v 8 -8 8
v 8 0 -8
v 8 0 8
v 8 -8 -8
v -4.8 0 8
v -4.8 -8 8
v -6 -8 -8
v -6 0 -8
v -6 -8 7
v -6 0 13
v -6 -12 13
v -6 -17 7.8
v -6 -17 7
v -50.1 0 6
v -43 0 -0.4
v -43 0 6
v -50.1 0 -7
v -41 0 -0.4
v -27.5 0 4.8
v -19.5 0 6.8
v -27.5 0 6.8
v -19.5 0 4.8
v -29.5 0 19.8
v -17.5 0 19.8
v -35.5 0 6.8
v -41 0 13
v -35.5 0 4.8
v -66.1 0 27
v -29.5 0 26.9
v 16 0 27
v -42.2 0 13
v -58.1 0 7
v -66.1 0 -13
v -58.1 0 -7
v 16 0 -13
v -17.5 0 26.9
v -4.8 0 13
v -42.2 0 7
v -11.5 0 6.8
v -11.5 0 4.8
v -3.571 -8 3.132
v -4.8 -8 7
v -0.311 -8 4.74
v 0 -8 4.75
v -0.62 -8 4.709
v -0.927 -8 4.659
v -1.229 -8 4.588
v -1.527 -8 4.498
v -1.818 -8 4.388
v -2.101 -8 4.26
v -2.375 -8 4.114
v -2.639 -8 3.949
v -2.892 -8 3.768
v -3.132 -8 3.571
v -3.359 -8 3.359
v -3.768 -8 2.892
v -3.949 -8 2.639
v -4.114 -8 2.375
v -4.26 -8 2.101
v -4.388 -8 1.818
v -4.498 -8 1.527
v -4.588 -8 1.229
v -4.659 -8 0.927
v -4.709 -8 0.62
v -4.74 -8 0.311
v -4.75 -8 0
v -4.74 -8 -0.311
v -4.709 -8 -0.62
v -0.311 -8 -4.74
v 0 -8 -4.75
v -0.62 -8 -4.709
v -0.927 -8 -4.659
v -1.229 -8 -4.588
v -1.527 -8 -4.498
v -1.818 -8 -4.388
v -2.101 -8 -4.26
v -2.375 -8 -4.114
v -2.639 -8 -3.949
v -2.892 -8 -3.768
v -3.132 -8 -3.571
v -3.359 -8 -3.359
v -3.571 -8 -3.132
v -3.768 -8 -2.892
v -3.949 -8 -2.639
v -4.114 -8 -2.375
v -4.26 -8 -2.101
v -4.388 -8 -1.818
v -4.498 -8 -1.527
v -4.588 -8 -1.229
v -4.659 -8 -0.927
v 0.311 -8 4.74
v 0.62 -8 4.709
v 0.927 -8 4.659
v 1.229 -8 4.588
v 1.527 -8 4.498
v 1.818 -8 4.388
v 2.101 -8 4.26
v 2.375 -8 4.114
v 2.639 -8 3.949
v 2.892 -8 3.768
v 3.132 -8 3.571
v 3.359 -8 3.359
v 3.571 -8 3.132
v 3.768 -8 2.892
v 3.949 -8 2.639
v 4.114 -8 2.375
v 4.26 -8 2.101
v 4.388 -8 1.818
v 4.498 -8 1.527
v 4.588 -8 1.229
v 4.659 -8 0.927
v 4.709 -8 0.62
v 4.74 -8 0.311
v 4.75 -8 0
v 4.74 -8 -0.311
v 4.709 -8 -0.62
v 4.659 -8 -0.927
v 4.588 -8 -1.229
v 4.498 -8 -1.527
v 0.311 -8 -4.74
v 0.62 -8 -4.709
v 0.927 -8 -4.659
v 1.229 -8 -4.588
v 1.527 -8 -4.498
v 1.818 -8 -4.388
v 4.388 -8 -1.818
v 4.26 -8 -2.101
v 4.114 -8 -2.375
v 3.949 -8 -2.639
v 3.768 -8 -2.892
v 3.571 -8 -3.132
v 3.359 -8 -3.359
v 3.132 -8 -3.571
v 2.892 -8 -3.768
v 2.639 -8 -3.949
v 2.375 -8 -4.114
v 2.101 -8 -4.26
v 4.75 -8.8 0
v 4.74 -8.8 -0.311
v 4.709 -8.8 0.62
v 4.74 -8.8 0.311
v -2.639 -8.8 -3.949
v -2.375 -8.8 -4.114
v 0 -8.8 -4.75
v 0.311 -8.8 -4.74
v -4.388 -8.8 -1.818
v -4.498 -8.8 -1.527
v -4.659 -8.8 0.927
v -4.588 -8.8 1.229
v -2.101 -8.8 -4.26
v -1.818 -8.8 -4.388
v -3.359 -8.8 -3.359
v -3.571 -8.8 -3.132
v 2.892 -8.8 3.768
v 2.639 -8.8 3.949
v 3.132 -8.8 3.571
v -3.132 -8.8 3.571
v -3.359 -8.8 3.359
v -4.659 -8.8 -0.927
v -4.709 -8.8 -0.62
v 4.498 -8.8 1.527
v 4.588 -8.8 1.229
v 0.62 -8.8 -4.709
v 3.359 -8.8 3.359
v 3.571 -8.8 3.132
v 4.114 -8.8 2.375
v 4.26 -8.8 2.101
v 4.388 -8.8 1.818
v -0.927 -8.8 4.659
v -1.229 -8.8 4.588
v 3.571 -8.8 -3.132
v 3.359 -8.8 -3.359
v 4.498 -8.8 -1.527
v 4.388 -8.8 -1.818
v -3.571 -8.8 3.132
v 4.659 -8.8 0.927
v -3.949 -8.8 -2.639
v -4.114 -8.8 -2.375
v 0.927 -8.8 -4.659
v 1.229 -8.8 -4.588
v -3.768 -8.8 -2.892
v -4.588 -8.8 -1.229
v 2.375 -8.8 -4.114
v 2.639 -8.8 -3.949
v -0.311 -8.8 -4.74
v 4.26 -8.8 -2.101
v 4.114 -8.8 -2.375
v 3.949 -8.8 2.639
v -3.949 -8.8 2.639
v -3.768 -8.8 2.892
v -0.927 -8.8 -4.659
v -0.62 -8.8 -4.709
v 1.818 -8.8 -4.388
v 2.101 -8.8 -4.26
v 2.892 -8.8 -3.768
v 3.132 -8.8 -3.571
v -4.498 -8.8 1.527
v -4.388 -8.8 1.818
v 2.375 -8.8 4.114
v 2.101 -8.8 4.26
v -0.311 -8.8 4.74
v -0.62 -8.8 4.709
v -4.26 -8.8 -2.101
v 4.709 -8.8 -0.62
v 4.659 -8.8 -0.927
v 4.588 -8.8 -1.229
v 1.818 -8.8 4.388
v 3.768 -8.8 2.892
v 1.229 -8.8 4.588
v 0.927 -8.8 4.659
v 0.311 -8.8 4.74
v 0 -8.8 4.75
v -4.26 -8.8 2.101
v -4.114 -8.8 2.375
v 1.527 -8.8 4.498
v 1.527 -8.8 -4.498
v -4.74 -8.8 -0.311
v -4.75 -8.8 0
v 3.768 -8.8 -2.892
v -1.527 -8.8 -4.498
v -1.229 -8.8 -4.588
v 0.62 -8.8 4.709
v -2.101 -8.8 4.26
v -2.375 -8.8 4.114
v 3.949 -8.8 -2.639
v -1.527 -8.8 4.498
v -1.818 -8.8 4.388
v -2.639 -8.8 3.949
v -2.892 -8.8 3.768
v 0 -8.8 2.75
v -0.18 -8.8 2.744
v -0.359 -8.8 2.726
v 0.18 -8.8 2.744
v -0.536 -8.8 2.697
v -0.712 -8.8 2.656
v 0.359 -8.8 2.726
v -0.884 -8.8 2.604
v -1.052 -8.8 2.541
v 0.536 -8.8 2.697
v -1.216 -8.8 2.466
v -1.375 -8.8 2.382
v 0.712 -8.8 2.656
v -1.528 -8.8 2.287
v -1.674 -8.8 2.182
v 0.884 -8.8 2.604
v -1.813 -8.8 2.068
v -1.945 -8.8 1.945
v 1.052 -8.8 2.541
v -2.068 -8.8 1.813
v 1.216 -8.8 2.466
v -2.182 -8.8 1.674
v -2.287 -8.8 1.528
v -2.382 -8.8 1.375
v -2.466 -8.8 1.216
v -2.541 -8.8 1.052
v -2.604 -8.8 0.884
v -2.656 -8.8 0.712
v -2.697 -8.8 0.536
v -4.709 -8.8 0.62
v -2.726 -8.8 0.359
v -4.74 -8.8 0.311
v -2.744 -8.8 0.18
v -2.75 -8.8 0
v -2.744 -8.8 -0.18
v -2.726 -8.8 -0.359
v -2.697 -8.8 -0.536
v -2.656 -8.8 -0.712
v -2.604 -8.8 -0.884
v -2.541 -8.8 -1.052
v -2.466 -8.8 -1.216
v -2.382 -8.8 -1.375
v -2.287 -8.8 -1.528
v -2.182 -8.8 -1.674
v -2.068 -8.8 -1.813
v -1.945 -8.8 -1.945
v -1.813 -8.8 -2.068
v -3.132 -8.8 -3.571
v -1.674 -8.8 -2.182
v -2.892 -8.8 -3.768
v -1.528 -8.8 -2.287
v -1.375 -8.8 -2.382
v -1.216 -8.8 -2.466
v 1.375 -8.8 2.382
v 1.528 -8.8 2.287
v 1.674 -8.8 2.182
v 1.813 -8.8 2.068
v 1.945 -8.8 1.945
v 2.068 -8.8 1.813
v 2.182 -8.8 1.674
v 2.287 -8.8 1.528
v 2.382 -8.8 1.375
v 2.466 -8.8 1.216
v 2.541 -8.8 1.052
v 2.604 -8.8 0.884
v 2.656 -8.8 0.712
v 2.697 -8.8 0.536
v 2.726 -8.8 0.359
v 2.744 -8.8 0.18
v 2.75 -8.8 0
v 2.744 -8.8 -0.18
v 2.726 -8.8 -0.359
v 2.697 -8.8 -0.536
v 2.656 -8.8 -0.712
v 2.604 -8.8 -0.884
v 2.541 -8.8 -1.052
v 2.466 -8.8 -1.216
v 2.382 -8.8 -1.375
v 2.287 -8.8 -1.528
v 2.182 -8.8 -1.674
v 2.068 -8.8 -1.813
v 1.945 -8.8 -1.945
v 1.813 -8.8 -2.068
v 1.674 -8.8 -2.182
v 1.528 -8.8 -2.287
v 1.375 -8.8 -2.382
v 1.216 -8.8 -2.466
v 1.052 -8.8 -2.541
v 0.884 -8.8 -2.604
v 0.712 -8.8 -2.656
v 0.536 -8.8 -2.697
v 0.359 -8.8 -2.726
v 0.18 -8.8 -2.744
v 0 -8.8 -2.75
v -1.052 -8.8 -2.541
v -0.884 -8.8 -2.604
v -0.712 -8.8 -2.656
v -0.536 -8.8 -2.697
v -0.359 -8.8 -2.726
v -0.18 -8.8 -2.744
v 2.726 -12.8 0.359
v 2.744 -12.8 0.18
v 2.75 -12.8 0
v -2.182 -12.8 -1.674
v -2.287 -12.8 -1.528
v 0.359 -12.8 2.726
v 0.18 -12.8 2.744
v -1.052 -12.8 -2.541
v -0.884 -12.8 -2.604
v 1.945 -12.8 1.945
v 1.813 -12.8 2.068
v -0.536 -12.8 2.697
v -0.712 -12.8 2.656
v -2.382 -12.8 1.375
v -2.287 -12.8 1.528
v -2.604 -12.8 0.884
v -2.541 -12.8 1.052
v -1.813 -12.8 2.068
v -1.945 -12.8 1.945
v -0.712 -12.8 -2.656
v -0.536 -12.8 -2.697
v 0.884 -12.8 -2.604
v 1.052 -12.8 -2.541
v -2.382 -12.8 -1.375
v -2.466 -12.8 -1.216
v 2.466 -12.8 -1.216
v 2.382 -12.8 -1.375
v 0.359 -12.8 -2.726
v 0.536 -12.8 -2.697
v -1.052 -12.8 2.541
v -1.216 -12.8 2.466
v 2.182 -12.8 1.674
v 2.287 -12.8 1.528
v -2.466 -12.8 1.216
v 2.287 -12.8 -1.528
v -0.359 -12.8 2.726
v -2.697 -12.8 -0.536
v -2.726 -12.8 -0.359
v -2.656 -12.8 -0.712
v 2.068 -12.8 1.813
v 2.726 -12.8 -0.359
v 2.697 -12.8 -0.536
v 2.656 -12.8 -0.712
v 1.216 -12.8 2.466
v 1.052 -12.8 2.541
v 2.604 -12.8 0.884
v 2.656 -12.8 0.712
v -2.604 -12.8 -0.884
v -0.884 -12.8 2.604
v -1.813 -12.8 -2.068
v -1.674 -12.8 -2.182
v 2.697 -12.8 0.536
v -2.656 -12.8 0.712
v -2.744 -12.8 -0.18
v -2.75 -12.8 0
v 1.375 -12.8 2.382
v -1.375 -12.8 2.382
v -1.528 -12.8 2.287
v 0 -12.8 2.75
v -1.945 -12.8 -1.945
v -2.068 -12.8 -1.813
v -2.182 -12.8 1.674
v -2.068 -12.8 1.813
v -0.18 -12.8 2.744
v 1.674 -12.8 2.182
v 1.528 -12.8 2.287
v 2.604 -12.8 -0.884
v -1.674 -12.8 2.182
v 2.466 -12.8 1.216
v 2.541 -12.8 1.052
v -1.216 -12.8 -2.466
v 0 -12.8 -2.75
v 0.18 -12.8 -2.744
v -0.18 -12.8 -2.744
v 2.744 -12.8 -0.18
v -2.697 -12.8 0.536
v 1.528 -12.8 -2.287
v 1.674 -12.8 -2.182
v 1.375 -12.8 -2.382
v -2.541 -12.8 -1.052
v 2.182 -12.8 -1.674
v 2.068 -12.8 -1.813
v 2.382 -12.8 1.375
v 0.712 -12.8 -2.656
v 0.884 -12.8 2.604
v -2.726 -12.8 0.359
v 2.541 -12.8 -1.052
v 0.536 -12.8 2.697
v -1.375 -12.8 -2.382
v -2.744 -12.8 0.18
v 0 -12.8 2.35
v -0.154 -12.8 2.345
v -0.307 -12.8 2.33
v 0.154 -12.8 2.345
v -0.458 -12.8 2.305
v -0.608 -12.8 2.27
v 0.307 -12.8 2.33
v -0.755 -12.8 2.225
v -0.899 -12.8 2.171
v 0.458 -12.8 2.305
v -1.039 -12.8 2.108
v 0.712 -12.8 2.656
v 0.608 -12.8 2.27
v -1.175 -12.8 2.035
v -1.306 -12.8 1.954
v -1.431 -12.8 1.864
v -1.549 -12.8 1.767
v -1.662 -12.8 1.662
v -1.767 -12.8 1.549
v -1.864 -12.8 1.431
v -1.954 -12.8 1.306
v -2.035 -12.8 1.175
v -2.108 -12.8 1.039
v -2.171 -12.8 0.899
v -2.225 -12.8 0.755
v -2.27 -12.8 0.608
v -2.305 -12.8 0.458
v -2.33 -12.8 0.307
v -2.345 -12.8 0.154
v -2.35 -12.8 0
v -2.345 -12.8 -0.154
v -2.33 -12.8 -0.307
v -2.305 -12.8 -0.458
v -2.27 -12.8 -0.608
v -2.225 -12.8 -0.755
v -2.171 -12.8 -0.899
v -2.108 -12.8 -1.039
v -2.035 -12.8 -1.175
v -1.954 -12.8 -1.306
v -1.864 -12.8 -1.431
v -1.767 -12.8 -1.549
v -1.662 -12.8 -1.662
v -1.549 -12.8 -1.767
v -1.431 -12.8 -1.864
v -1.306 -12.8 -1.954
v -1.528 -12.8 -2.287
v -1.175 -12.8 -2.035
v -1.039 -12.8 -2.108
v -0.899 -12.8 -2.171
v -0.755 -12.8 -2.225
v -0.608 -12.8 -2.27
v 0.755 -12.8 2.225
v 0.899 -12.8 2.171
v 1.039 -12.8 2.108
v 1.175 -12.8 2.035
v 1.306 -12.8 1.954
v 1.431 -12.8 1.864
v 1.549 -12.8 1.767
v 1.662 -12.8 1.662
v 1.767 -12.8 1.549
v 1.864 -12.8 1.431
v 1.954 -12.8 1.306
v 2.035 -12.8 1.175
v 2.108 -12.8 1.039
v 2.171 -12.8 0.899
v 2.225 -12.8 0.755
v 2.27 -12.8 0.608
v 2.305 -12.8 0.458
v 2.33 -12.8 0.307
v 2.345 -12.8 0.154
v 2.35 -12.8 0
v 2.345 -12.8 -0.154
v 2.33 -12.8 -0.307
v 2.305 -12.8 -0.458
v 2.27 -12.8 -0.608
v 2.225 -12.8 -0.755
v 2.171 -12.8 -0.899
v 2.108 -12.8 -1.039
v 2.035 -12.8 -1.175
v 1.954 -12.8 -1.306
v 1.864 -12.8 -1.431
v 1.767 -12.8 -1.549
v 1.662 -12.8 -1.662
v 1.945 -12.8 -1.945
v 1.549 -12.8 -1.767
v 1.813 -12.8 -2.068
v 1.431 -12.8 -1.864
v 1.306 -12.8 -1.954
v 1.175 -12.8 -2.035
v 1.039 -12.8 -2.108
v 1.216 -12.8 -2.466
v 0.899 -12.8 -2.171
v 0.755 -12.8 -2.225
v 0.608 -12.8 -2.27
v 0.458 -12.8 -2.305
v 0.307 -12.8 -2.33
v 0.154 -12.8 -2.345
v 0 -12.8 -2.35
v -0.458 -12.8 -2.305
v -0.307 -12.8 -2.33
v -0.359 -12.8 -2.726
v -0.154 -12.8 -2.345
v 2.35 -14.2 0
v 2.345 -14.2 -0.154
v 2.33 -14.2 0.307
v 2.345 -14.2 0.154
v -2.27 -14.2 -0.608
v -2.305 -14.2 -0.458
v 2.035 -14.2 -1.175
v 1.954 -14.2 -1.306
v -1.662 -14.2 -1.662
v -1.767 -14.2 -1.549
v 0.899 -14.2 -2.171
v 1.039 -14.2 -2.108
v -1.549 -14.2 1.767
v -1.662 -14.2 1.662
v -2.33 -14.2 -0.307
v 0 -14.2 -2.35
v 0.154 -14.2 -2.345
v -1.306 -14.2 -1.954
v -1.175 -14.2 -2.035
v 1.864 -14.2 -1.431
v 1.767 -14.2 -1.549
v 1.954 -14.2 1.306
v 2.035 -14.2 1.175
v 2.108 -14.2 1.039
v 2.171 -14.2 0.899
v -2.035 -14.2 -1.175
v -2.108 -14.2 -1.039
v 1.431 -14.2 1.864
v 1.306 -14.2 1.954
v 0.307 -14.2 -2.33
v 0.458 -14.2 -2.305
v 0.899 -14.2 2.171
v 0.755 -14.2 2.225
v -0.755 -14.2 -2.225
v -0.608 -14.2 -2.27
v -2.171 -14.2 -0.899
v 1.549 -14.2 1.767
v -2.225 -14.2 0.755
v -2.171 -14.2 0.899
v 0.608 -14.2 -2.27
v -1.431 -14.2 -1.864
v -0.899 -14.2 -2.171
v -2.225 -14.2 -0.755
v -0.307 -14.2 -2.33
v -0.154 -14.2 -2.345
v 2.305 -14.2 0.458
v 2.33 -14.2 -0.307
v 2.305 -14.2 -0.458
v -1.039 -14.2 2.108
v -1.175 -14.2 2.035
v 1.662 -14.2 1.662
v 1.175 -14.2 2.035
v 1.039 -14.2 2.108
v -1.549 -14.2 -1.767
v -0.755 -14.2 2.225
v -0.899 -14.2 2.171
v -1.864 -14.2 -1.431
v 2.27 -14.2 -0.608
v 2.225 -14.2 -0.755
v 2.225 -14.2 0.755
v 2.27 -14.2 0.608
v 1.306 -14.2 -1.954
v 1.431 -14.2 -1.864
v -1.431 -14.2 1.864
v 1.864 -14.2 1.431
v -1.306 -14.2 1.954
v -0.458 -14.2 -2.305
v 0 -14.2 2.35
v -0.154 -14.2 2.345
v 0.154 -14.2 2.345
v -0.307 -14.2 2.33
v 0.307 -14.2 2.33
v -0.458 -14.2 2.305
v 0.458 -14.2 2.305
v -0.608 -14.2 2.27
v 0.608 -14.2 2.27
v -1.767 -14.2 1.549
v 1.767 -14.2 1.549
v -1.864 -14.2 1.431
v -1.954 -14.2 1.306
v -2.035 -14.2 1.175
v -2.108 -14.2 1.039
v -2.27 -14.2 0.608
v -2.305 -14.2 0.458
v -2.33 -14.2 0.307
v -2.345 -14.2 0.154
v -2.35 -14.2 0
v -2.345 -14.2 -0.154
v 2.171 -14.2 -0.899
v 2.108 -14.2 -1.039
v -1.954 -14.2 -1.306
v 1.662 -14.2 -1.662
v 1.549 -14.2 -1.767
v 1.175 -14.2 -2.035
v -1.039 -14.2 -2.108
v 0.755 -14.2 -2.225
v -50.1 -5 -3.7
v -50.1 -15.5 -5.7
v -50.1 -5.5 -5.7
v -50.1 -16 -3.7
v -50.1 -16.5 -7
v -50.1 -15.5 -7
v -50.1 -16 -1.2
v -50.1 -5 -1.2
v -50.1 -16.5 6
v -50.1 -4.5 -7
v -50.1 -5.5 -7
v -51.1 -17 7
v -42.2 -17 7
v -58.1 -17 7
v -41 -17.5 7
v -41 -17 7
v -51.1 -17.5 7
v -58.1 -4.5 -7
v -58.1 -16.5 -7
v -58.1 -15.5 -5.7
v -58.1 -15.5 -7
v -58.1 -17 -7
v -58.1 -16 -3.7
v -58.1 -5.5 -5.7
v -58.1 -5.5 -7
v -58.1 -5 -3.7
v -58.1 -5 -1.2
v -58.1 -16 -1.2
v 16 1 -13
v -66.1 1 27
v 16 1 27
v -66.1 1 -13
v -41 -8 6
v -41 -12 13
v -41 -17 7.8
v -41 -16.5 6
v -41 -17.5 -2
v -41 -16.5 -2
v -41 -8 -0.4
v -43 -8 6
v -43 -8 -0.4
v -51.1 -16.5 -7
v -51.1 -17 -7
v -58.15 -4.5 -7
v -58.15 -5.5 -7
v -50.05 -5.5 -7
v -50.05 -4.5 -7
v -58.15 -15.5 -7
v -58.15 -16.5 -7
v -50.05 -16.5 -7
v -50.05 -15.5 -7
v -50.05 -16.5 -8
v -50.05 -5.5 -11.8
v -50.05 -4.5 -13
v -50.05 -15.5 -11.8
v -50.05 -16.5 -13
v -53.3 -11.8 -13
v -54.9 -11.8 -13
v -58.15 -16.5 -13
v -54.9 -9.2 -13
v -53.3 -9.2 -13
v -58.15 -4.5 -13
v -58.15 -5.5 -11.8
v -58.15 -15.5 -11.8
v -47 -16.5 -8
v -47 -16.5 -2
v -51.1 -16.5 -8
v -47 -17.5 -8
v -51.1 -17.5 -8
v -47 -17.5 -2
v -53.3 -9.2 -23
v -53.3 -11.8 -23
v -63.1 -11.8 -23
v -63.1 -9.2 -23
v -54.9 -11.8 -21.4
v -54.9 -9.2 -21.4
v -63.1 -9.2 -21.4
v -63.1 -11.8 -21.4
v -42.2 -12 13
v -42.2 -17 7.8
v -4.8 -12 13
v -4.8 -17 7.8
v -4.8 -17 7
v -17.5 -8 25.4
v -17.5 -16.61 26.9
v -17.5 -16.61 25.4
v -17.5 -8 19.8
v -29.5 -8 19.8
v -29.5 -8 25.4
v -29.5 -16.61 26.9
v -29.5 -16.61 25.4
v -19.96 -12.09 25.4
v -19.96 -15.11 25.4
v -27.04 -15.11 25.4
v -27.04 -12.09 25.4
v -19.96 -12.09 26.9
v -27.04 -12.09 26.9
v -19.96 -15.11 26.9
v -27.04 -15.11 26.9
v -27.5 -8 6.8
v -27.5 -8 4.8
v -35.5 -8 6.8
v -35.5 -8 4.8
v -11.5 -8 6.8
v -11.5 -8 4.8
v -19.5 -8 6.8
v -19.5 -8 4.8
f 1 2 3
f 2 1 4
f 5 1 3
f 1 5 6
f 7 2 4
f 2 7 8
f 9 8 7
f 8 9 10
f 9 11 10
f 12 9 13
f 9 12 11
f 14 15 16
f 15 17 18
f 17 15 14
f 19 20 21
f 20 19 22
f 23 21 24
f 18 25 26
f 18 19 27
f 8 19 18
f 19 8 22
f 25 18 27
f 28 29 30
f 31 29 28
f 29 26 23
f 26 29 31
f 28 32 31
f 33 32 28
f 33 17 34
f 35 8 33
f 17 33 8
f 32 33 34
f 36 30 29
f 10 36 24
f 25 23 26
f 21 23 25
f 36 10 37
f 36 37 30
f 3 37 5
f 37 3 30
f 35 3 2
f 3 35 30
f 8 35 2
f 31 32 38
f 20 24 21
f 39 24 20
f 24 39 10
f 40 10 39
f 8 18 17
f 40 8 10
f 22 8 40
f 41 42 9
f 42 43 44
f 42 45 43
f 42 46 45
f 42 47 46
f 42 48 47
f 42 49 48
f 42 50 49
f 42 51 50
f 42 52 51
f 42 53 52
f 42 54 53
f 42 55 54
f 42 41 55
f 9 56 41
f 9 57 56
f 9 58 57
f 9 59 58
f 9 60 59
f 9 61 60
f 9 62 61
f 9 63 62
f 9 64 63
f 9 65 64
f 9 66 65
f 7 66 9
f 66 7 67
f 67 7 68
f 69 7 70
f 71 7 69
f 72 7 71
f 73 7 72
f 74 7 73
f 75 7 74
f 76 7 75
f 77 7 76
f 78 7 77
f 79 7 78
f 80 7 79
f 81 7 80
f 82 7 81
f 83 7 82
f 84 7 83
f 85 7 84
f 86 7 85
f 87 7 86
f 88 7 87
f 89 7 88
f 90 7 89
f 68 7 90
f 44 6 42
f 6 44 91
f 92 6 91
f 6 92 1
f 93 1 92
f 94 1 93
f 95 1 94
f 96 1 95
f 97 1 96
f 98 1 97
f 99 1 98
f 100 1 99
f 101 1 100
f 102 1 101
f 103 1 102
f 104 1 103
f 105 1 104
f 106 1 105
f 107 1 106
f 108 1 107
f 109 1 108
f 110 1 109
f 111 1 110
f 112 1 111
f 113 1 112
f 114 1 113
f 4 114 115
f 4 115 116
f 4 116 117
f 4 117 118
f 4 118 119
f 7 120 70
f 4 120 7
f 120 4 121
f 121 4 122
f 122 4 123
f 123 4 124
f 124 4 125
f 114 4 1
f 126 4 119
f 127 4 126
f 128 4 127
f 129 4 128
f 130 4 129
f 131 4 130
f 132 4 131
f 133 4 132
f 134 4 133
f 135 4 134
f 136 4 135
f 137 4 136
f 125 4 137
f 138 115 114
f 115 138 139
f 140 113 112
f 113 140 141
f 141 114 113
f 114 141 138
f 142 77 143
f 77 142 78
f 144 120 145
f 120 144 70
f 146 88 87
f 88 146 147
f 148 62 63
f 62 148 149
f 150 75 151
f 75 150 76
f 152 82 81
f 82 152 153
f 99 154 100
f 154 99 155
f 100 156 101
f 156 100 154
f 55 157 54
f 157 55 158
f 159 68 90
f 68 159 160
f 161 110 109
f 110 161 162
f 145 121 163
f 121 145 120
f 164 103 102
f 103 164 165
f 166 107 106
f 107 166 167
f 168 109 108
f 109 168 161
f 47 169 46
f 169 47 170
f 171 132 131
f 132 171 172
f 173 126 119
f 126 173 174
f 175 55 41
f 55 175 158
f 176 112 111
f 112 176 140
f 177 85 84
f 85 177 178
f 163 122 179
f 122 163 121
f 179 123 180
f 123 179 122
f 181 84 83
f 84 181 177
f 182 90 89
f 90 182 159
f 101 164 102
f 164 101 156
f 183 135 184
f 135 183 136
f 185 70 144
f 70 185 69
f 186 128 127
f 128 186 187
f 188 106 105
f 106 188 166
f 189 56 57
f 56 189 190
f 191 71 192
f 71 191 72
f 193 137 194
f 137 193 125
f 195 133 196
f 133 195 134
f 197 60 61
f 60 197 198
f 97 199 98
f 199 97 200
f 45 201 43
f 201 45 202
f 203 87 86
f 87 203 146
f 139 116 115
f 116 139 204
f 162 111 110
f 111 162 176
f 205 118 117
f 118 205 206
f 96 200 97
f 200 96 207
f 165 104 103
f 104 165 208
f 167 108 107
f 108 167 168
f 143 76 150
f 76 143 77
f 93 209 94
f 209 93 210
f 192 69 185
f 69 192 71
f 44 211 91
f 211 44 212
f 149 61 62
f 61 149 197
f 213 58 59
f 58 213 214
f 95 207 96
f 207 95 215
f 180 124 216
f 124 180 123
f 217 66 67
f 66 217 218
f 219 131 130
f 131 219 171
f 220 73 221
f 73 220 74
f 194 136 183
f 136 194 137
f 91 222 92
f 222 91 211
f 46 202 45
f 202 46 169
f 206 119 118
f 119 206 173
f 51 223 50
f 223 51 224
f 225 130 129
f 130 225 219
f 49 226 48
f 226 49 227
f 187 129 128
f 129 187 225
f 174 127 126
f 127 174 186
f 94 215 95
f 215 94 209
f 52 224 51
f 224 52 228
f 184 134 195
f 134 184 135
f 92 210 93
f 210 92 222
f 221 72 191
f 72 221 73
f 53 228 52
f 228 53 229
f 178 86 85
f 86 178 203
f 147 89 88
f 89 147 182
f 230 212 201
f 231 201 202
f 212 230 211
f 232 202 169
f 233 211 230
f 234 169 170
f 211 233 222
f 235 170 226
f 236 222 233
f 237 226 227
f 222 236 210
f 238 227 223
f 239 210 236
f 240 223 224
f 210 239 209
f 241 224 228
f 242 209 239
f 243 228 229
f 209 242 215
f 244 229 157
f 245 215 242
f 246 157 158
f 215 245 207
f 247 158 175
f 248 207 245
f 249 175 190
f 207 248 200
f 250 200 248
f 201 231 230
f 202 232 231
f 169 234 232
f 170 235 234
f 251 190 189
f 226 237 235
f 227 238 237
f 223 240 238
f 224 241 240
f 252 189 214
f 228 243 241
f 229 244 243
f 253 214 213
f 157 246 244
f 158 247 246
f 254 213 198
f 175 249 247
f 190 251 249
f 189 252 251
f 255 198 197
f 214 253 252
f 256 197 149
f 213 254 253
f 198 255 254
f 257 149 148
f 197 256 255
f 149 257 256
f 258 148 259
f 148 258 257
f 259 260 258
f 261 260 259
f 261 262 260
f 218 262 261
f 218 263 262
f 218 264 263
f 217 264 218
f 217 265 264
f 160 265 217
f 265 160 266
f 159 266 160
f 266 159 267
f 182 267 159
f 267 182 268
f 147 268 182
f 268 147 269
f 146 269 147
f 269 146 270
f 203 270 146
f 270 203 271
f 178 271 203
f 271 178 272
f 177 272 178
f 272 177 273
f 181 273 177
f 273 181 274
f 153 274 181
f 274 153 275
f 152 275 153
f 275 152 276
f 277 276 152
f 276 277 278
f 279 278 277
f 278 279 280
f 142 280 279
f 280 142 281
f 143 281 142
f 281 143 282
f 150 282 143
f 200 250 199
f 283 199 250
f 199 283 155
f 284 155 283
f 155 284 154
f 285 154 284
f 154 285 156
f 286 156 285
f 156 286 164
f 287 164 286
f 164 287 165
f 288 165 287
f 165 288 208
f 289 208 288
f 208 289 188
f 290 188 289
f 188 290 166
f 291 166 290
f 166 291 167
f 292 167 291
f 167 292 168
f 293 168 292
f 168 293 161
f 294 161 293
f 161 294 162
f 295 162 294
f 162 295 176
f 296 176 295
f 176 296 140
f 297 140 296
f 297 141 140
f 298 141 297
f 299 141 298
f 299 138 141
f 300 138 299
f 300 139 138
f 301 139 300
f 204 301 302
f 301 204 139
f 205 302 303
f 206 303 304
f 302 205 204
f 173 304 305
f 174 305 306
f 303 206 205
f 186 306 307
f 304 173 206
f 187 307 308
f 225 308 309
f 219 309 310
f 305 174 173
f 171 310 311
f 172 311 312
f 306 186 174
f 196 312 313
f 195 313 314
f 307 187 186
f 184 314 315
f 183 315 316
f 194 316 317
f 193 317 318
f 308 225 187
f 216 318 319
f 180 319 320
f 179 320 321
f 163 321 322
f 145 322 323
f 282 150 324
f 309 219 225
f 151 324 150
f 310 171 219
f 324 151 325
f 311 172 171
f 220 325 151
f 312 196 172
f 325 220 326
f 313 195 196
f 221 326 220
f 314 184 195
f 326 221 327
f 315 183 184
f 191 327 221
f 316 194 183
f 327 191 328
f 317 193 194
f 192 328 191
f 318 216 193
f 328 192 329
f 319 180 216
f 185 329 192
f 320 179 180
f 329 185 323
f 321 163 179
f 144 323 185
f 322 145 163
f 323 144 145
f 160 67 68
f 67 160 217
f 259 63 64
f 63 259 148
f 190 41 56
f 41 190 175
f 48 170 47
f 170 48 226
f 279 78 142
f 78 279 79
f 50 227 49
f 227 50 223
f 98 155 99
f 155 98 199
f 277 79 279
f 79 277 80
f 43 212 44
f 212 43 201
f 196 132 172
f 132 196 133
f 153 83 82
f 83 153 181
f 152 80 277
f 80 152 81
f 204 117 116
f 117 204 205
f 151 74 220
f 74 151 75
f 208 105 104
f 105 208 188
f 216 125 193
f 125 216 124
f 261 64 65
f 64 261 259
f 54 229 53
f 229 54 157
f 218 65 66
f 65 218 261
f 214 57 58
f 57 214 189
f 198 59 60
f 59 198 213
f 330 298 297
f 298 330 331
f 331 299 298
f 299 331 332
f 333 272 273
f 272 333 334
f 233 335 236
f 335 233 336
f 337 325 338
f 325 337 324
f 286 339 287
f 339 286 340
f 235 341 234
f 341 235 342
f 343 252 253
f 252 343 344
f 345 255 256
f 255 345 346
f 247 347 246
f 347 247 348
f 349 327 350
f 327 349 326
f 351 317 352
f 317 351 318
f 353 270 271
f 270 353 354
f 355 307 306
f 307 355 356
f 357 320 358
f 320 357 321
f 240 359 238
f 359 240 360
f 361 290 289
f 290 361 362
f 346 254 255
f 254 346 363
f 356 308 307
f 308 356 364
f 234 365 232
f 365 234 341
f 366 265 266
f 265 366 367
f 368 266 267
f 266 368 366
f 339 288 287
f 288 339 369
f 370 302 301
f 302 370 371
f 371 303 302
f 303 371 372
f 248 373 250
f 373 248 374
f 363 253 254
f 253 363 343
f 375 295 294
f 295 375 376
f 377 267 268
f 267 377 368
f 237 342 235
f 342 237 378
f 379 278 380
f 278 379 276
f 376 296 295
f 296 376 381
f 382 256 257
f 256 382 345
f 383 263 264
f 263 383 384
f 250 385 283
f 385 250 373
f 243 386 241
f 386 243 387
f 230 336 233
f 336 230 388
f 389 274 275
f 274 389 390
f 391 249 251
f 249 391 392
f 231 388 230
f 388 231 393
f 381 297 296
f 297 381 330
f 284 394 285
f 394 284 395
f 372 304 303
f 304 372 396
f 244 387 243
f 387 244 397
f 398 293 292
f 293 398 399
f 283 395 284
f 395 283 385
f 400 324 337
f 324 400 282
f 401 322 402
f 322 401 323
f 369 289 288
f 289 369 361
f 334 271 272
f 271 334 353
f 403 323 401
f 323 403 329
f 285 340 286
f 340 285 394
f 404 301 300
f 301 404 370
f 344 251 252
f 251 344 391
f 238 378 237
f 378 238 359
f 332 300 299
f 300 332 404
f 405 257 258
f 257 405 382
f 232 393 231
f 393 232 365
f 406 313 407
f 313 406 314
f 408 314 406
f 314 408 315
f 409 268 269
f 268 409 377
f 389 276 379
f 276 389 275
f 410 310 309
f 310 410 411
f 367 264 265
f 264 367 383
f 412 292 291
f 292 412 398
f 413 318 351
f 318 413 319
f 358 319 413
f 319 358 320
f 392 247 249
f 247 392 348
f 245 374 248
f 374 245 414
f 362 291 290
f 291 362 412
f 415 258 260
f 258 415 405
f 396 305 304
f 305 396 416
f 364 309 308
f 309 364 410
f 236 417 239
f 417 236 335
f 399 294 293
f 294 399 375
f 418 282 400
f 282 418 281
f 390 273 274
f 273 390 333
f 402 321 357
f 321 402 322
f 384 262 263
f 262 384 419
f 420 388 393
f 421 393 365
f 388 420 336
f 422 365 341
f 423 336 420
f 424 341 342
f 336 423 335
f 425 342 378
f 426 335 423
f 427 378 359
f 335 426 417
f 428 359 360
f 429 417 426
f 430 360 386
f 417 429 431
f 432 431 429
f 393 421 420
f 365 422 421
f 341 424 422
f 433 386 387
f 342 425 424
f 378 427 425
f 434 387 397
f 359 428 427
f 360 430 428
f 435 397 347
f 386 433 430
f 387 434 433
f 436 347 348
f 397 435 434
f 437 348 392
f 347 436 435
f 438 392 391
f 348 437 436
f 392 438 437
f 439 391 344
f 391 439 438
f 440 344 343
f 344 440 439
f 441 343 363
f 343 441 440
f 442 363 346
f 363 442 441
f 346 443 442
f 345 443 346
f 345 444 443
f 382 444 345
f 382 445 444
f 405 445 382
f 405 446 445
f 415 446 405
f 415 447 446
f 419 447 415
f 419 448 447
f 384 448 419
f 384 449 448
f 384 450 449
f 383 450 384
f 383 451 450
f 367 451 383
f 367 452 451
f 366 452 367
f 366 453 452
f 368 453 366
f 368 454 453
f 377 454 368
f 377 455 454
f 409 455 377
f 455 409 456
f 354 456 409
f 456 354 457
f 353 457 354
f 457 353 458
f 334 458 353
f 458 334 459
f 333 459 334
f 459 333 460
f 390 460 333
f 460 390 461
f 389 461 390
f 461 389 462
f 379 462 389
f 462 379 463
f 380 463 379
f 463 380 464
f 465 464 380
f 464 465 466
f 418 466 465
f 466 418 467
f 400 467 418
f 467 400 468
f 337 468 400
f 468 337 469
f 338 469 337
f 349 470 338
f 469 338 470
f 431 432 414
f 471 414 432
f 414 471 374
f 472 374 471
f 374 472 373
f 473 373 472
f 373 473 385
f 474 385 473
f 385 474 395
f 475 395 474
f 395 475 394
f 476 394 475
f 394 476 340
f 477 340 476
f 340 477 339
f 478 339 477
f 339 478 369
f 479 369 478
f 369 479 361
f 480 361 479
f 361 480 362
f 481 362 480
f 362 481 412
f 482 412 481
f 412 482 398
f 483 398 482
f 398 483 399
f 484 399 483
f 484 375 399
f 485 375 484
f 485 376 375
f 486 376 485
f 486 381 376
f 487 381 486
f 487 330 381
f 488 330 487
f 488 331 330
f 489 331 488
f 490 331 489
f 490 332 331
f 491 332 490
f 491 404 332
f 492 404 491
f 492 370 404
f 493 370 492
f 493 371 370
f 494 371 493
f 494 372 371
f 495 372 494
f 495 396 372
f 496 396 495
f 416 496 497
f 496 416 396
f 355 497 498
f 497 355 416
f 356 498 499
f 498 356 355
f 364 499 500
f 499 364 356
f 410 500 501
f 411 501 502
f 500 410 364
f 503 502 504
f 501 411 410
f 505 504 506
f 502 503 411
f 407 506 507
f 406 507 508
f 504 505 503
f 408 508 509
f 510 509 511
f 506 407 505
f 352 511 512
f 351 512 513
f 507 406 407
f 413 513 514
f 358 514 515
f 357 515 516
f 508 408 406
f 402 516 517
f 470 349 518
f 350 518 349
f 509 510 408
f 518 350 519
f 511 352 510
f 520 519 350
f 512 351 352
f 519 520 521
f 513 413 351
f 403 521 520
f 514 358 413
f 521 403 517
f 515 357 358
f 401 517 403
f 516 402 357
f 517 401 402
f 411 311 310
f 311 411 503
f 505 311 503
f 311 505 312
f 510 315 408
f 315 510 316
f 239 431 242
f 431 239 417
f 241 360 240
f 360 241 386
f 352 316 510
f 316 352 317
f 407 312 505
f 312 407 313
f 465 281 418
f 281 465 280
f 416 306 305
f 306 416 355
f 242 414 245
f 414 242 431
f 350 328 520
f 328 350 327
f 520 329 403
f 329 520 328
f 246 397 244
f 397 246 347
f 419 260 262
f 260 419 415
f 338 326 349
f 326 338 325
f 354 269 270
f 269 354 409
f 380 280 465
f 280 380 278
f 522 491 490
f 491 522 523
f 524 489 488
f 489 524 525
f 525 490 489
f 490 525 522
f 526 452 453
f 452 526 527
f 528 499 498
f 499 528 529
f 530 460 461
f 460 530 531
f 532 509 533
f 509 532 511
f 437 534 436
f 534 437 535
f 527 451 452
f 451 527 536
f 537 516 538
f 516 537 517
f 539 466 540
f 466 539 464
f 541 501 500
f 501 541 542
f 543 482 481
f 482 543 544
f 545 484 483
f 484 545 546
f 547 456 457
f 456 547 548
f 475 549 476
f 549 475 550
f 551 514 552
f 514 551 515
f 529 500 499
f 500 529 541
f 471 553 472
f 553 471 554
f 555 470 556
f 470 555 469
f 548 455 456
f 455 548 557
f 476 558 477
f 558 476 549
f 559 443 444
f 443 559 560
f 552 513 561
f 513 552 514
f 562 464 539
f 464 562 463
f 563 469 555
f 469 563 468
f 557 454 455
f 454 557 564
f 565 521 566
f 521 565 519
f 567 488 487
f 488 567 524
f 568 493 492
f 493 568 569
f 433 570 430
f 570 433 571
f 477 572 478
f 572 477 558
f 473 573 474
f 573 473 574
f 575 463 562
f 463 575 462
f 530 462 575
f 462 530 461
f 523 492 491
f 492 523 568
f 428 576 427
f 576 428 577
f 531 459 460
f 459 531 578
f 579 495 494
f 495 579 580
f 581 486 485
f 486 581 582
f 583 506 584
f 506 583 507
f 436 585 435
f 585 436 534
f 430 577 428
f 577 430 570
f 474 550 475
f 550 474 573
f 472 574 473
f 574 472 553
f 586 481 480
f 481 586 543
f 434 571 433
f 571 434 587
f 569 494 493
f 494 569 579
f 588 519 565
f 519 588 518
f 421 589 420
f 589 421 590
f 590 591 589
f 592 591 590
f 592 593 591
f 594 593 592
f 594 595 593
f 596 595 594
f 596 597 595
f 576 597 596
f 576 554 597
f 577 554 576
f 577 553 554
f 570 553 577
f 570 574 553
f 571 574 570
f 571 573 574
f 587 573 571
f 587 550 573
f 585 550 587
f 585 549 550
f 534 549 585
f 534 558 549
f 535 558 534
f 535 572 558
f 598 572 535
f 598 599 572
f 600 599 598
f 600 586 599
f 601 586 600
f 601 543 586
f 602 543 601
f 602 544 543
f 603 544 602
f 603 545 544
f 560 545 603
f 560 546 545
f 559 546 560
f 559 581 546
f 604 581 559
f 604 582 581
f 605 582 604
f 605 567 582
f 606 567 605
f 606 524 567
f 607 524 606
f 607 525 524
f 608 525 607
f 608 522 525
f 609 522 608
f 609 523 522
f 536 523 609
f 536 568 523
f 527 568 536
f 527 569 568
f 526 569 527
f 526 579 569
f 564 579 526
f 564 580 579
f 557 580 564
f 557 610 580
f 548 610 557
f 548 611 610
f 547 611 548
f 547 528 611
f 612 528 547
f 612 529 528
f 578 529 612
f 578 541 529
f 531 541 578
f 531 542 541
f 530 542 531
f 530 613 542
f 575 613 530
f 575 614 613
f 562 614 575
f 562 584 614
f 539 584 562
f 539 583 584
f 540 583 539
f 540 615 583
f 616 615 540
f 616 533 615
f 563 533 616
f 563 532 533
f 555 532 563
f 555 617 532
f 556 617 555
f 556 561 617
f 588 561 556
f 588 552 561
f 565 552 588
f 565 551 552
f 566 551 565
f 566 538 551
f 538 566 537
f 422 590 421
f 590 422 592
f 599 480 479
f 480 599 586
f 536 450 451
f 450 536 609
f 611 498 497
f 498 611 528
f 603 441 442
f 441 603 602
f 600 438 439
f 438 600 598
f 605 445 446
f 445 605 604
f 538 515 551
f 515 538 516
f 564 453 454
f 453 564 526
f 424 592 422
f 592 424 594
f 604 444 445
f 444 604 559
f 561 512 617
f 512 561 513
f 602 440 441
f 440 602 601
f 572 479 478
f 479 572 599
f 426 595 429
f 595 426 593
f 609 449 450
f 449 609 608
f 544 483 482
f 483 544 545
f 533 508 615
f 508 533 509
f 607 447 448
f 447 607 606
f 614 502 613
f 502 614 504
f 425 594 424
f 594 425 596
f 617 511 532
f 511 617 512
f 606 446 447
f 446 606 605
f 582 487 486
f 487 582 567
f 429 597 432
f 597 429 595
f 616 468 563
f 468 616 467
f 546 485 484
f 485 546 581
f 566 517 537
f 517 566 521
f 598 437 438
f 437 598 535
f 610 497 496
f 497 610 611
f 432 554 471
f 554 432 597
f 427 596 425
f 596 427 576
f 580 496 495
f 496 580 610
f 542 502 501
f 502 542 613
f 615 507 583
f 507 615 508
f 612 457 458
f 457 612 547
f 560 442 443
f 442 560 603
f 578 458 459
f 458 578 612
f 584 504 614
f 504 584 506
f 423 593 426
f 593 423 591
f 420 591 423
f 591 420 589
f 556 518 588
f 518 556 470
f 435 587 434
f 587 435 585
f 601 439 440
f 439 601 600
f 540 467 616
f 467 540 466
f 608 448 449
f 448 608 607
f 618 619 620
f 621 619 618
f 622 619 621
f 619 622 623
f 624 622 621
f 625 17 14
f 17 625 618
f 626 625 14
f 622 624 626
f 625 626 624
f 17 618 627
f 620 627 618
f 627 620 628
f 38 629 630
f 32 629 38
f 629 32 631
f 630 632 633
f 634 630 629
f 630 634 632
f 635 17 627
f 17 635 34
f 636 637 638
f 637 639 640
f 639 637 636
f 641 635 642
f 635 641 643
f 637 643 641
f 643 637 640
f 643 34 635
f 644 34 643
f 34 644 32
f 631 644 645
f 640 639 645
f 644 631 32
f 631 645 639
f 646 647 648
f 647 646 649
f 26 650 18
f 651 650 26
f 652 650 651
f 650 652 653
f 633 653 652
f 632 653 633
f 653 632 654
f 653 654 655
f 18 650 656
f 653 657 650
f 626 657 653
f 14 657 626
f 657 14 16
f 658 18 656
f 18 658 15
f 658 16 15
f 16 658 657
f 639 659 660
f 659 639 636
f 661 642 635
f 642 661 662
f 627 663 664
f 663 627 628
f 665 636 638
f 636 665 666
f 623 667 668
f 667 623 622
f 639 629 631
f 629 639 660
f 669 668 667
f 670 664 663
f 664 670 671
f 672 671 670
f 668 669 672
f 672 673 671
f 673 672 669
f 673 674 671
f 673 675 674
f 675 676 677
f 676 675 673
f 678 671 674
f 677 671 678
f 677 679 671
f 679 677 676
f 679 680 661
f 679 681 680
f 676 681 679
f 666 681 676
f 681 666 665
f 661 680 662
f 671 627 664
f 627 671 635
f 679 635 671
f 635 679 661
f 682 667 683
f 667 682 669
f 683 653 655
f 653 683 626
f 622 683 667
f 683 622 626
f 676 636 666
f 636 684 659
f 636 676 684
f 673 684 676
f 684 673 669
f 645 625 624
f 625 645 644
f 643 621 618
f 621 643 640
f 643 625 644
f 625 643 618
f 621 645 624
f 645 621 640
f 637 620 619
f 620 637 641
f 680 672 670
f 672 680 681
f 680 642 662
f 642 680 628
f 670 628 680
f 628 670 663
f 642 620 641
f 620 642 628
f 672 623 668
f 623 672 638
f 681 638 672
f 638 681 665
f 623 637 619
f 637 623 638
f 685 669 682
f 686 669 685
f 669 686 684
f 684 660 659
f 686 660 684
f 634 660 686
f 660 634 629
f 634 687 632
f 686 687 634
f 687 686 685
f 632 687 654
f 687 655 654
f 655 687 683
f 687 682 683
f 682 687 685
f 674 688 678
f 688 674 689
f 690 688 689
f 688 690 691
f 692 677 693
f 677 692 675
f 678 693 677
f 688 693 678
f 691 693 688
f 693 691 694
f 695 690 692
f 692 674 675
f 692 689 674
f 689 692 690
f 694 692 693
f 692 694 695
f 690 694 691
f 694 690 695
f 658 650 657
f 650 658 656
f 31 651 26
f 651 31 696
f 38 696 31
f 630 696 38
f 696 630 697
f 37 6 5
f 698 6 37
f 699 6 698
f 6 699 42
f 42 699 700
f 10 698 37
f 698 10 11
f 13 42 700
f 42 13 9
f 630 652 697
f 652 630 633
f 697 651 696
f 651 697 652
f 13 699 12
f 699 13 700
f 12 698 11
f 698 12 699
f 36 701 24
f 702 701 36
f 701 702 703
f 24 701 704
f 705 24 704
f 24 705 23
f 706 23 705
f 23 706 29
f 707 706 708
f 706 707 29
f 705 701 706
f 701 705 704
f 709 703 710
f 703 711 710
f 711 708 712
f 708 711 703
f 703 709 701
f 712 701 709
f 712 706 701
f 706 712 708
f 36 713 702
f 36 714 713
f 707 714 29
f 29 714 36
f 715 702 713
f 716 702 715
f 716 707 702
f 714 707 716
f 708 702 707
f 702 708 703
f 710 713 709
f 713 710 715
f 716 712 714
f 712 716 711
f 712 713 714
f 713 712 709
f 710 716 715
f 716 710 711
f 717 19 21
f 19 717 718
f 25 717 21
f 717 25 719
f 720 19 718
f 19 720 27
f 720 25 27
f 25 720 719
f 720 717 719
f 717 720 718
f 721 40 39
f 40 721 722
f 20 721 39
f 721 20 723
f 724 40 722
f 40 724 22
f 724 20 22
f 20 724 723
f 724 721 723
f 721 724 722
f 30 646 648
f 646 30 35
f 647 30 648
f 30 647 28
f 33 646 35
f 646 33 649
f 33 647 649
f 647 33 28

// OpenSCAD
$fn = 96;

inch = 25.4;
eps  = 0.05;

// =========================================================
// CONVENTIONAL FRAME
// x: right is +
// y: away from viewer is +
// z: up is +
// wall plane is y = 0
//
// mounted hardware projecting toward viewer lives in NEGATIVE y
// =========================================================

// =========================================================
// GLOBAL / WALL
// =========================================================
show_wall = true;
wall_t    = 1.0;

// Common outward Y plane for the latch pad, tunnel-side stop, and weight
// stops/backer. Keeping one datum makes all three contact faces flush.
shared_contact_depth_y = 8.0;

// wall will auto-expand to fit both latch base and tunnel
wall_margin = 5;
// 
// LATCH BASE PARAMS
// =========================================================
pad_w = 16;   // X
pad_h = 16;   // Z
pad_t = shared_contact_depth_y; // protrusion toward viewer => negative Y

standoff_d = 9.5;
standoff_h = 0.8;   // along Y
post_d     = 5.5;
post_h     = 4.0;   // along Y
neck_d     = 4.7;
neck_h     = 1.4;   // along Y

// These are retained only because tunnel placement is still
// logically referenced from where the latch bar tip used to be.
eye_outer_d = 13.0;
arm_len     = 1.5 * inch;
tip_len     = 2.0;

// =========================================================
// LATCH BASE Y STACK
// =========================================================
pad_y_wall = 0;
pad_y_out  = -pad_t;

standoff_y0 = pad_y_out;
standoff_y1 = standoff_y0 - standoff_h;

post_y0 = standoff_y1;
post_y1 = post_y0 - post_h;

neck_y0 = post_y1;
neck_y1 = neck_y0 - neck_h;

// =========================================================
// LATCH REFERENCE X/Z GEOMETRY
// =========================================================
bar_x_inner = -(eye_outer_d/2 - 0.5);
bar_x_outer = bar_x_inner - arm_len;

tip_x0 = bar_x_outer - tip_len;
tip_x1 = bar_x_outer;

// =========================================================
// TUNNEL PARAMS
// =========================================================
tunnel_w_x = 8.0;
tunnel_d_y = 13.0;
tunnel_h_z = 14.0;

slot_margin_y = 1;
slot_h_z      = 2.5;
slot_offset_z = -2.45; // preserves the existing -1.2 mm slot ceiling

// underside cubby
cubby_wall_y  = 1.0;
cubby_drop_z  = 6;
cubby_depth_z = 6.1;  // gains the 1.1 mm removed from the zipper-head slot
cubby_extra_y = -1.0;
cubby_floor_z = 1.2;

// placement controls
tunnel_gap_from_tip = 4.0;
tunnel_mount_dx     = 0.0;
tunnel_mount_dz     = 0.0;

tunnel_y_back  = 1;
tunnel_y_front = tunnel_y_back - tunnel_d_y;

// Move the complete zipper/tunnel mechanism outward as one unchanged unit.
// A solid wall of this thickness occupies its former wall-side position.
tunnel_system_standoff_y = 5.0;

// =========================================================
// CROOK PARAMS
// =========================================================
crook_w_x      = 1.6;
crook_t_y      = 2.6;
crook_drop_z   = 10.0;
crook_left_dx  = 9.0;
crook_rise_z   = 6.0;
crook_mount_dx = 0.0;
crook_mount_dy = 0.0;

// =========================================================
// DERIVED TUNNEL PLACEMENT
// =========================================================
tunnel_x1 = tip_x0 - tunnel_gap_from_tip + tunnel_mount_dx;
tunnel_x0 = tunnel_x1 - tunnel_w_x;

tunnel_z0 = -tunnel_h_z/2 + tunnel_mount_dz;
tunnel_z1 =  tunnel_h_z/2 + tunnel_mount_dz;

slot_x0 = tunnel_x0 - eps;
slot_x1 = tunnel_x1 + eps;

slot_y0 = tunnel_y_front + slot_margin_y;
slot_y1 = tunnel_y_back  - slot_margin_y;

slot_zc = (tunnel_z0 + tunnel_z1) / 2 + slot_offset_z;
slot_z0 = slot_zc - slot_h_z/2;
slot_z1 = slot_zc + slot_h_z/2;

//=========================================================
// WEIGHT SIDE GUARDS
// =========================================================
weight_stack_w_x = 32;                // two bare stick-on wheel weights
weight_guard_slop_x = 3;              // 1.5 mm clearance per side
blinder_gap_x = weight_stack_w_x + weight_guard_slop_x; // 35 mm clear opening
carriage_center_x = -23.5;   // <-- set this to the carriage center
blinder_dx = 0;            // <-- shift knob
blinder_wall_x = 1.2;
blinder_y0 = tunnel_y_front;
blinder_y1 = tunnel_y_back;
blinder_z0 = tunnel_z1;
blinder_h_z = 6.0; 

// Continue each lateral guard to the relocated tunnel's outward Y face.
// The extension slopes downward toward a short blunt tip so a moving paper
// edge meets a lead-in surface rather than the former square guard end.
blinder_ramp_y0 = tunnel_y_front - tunnel_system_standoff_y;
blinder_ramp_tip_d_y = 0.6;
blinder_ramp_tip_h_z = 0.8;

blinder_left_x1  = carriage_center_x + blinder_dx - blinder_gap_x/2;
blinder_left_x0  = blinder_left_x1 - blinder_wall_x;

blinder_right_x0 = carriage_center_x + blinder_dx + blinder_gap_x/2;
blinder_right_x1 = blinder_right_x0 + blinder_wall_x;

// Carry the full guard clearance through the supporting geometry below.
weight_clear_x0 = blinder_left_x1;
weight_clear_x1 = blinder_right_x0;
latch_pad_x0 = weight_clear_x1;
latch_pad_x1 = pad_w/2;

// Lightweight stationary backer for the weight stack. X positioning comes
// from the double weights and lateral guides, so this contact can stay narrow.
weight_retainer_w_x = 12.0;
weight_backer_w_x = weight_retainer_w_x;
weight_backer_h_z = 5.0;
weight_backer_extension_y = shared_contact_depth_y;
zipper_head_max_h_z = 1.5;
latch_arm_h_z = 6.0;
weight_piece_h_z = 19.0;               // measured bulk wheel-weight height
weight_stack_height_factor_z = 1.0;    // all weight pieces sit at equal Z
resting_latch_top_z = slot_z0 + zipper_head_max_h_z + latch_arm_h_z;
captured_weight_top_z = resting_latch_top_z
                        + weight_stack_height_factor_z * weight_piece_h_z;
captured_weight_bottom_z = captured_weight_top_z - weight_piece_h_z;
weight_backer_xc = (weight_clear_x0 + weight_clear_x1) / 2;
weight_backer_x0 = weight_backer_xc - weight_backer_w_x/2;
weight_backer_x1 = weight_backer_xc + weight_backer_w_x/2;
weight_backer_y0 = -weight_backer_extension_y;
weight_backer_y1 = wall_t;
weight_backer_z1 = captured_weight_top_z;
weight_backer_z0 = weight_backer_z1 - weight_backer_h_z;
weight_backer_zc = (weight_backer_z0 + weight_backer_z1) / 2;

// Straight guide roof over the rear weight layer. A thin vertical tie stick
// attached to the moving weight stack passes through the roof slot, capturing
// the stack in X/Y while leaving it free to travel in Z.
weight_layer_depth_y = 5.0;
weight_overhang_clearance_y = 0.6;
weight_overhang_top_clearance_z = 0.6;
weight_overhang_roof_t_z = 1.5;
// Raise the connected upper backer/web/roof assembly without moving the
// separate lower nubs or increasing the established +27 mm wall envelope.
weight_retainer_raise_z = 2.0;
// After the raise, the roof top is +26.9 mm, leaving 0.1 mm below the wall top.
weight_retainer_wall_margin_z = 0.1;

// Measured wooden coffee stirrer in a deliberately loose guide slot. This is
// retention, not a bearing fit: generous X/Y clearance prevents the stick
// from wedging as the latch moves. The outer roof margin encloses the slot.
weight_guide_stick_w_x = 0.20 * inch;  // 5.08 mm
weight_guide_stick_d_y = 0.05 * inch;  // 1.27 mm
weight_stick_slot_clearance_x = 2.00;  // total clearance => 7.08 mm slot
weight_stick_slot_clearance_y = 1.75;  // total clearance => 3.02 mm slot
weight_stick_slot_outer_margin_y = 1.5;

weight_stick_slot_w_x = weight_guide_stick_w_x
                      + weight_stick_slot_clearance_x;
weight_stick_slot_d_y = weight_guide_stick_d_y
                      + weight_stick_slot_clearance_y;
weight_stick_slot_xc = weight_backer_xc;
weight_stick_slot_yc = weight_backer_y0
                     - weight_layer_depth_y
                     - weight_overhang_clearance_y;
weight_stick_slot_x0 = weight_stick_slot_xc - weight_stick_slot_w_x/2;
weight_stick_slot_x1 = weight_stick_slot_xc + weight_stick_slot_w_x/2;
weight_stick_slot_y0 = weight_stick_slot_yc - weight_stick_slot_d_y/2;
weight_stick_slot_y1 = weight_stick_slot_yc + weight_stick_slot_d_y/2;

weight_overhang_x0 = weight_backer_x0;
weight_overhang_x1 = weight_backer_x1;
weight_overhang_roof_y0 = weight_stick_slot_y0
                        - weight_stick_slot_outer_margin_y;
weight_overhang_roof_y1 = wall_t;
weight_overhang_roof_z0 = weight_backer_z1
                        + weight_overhang_top_clearance_z;
weight_overhang_roof_z1 = weight_overhang_roof_z0
                        + weight_overhang_roof_t_z;

// Fill the small wall-side gap between the upper Y stop and retainer roof.
weight_backer_web_z0 = weight_backer_z1;
weight_backer_web_z1 = weight_overhang_roof_z0;

// Two wall-rooted Y stops contact the lower portions of the two rear weights.
// Their centers follow the centers of the two 16 mm pieces rather than landing
// on the adhesive seam between them.
lower_weight_stop_bottom_inset_z = 1.0;
lower_weight_stop_each_w_x = 8.0;
lower_weight_stop_center_offset_x = weight_stack_w_x / 4; // +/- 8 mm
lower_weight_stop_extension_y = weight_backer_extension_y;
lower_weight_stop_h_z = 2.0;
lower_weight_stop_y0 = -lower_weight_stop_extension_y;
lower_weight_stop_y1 = wall_t;
lower_weight_stop_z0 = captured_weight_bottom_z
                     + lower_weight_stop_bottom_inset_z;
lower_weight_stop_z1 = lower_weight_stop_z0 + lower_weight_stop_h_z;
// =========================================================

// =========================================================
// VISOR
// =========================================================
visor_t_z        = 1.0;
visor_overlap_x  = 1.0;
visor_extra_y    = .5;

visor_x0    = tunnel_x1 - visor_overlap_x;
visor_x1    = weight_clear_x0;

visor_y0    = tunnel_y_front - visor_extra_y;
visor_y1    = tunnel_y_back;

visor_z0    = tunnel_z1 - visor_t_z;
visor_z1    = tunnel_z1;

// =========================================================
// VISOR DROP
// =========================================================
visor_drop_y_t = 1.0;
visor_drop_z   = 14.0;

visor_drop_x0 = visor_x0;
visor_drop_x1 = visor_x1;

visor_drop_y0 = visor_y0;
visor_drop_y1 = visor_y0 + visor_drop_y_t;

visor_drop_z0 = visor_z0 - visor_drop_z;
visor_drop_z1 = visor_z0;

// =========================================================
// INNER STOP
// =========================================================
inner_stop_x_w       = 2.0;
inner_stop_gap_z     = 0.8;
inner_stop_depth_y   = 3.0;

inner_stop_x0 = visor_x1 - inner_stop_x_w;
inner_stop_x1 = visor_x1;

inner_stop_y0 = -inner_stop_depth_y;
inner_stop_y1 = wall_t;

inner_stop_z0 = slot_z1 + inner_stop_gap_z;
inner_stop_z1 = visor_z0;

// The 5 mm backing follows only the three wall-contact footprints of the
// relocated system instead of filling their entire rectangular envelope.
tunnel_backing_y0 = tunnel_y_back - tunnel_system_standoff_y;
tunnel_backing_y1 = tunnel_y_back;

// =========================================================
// AUTO WALL FOOTPRINT
// =========================================================
hardware_x0 = min(latch_pad_x0, tunnel_x0);
hardware_x1 = max(latch_pad_x1, visor_x1);

hardware_z0 = min(-pad_h/2, min(tunnel_z0 - cubby_drop_z, visor_drop_z0));
hardware_z1 = max( pad_h/2, tunnel_z1);

wall_w = (hardware_x1 - hardware_x0) + 2*wall_margin;
wall_h = (hardware_z1 - hardware_z0) + 2*wall_margin;

// =========================================================
// HELPERS
// =========================================================
module rect_prism(x0, x1, y0, y1, z0, z1) {
    translate([min(x0,x1), min(y0,y1), min(z0,z1)])
        cube([abs(x1-x0), abs(y1-y0), abs(z1-z0)]);
}

module cyl_y_span(d, y0, y1) {
    translate([0, max(y0,y1), 0])
        rotate([90,0,0])
            cylinder(d=d, h=abs(y1-y0), center=false);
}

module tunnel_crook() {
    crook_top_z = tunnel_z0 - cubby_drop_z;

    crook_xc = (slot_x0 + slot_x1) / 2 + crook_mount_dx;
    crook_yc = ((slot_y0 - cubby_extra_y/2) + (slot_y1 + cubby_extra_y/2)) / 2 + crook_mount_dy;

    crook_vert_x0 = crook_xc - crook_w_x/2;
    crook_vert_x1 = crook_xc + crook_w_x/2;
    crook_vert_y0 = crook_yc - crook_t_y/2;
    crook_vert_y1 = crook_yc + crook_t_y/2;
    crook_vert_z0 = crook_top_z - crook_drop_z;
    crook_vert_z1 = crook_top_z;

    crook_horiz_x0 = crook_xc - crook_left_dx;
    crook_horiz_x1 = crook_xc;
    crook_horiz_y0 = crook_vert_y0;
    crook_horiz_y1 = crook_vert_y1;
    crook_horiz_z0 = crook_vert_z0;
    crook_horiz_z1 = crook_vert_z0 + crook_w_x;

    union() {
        rect_prism(crook_vert_x0, crook_vert_x1, crook_vert_y0, crook_vert_y1, crook_vert_z0, crook_vert_z1);
        rect_prism(crook_horiz_x0, crook_horiz_x1, crook_horiz_y0, crook_horiz_y1, crook_horiz_z0, crook_horiz_z1);
    }
}
module carriage_blinders() {
    z1 = blinder_z0 + blinder_h_z;

    union() {
        rect_prism(blinder_left_x0, blinder_left_x1,
                   blinder_y0, blinder_y1,
                   blinder_z0, z1);

        rect_prism(blinder_right_x0, blinder_right_x1,
                   blinder_y0, blinder_y1,
                   blinder_z0, z1);

        lateral_guard_lead_in(blinder_left_x0, blinder_left_x1, z1);
        lateral_guard_lead_in(blinder_right_x0, blinder_right_x1, z1);
    }
}

module lateral_guard_lead_in(x0, x1, z1) {
    hull() {
        // Short printable nose at the common tunnel/guard outward plane.
        rect_prism(
            x0, x1,
            blinder_ramp_y0,
            blinder_ramp_y0 + blinder_ramp_tip_d_y,
            blinder_z0,
            blinder_z0 + blinder_ramp_tip_h_z
        );

        // Overlap the existing full-height guard at the ramp root.
        rect_prism(
            x0, x1,
            blinder_y0,
            blinder_y0 + blinder_ramp_tip_d_y,
            blinder_z0,
            z1
        );
    }
}

module stationary_weight_backer() {
    union() {
        rect_prism(
            weight_backer_x0, weight_backer_x1,
            weight_backer_y0, weight_backer_y1,
            weight_backer_z0, weight_backer_z1
        );

        rect_prism(
            weight_backer_x0, weight_backer_x1,
            weight_backer_y0, weight_backer_y1,
            weight_backer_web_z0, weight_backer_web_z1
        );
    }
}

module lower_weight_stop_nubs() {
    for (side = [-1, 1]) {
        nub_xc = weight_backer_xc
               + side * lower_weight_stop_center_offset_x;

        rect_prism(
            nub_xc - lower_weight_stop_each_w_x/2,
            nub_xc + lower_weight_stop_each_w_x/2,
            lower_weight_stop_y0, lower_weight_stop_y1,
            lower_weight_stop_z0, lower_weight_stop_z1
        );
    }
}

module weight_overhang_retainer() {
    difference() {
        rect_prism(
            weight_overhang_x0, weight_overhang_x1,
            weight_overhang_roof_y0, weight_overhang_roof_y1,
            weight_overhang_roof_z0, weight_overhang_roof_z1
        );

        rect_prism(
            weight_stick_slot_x0, weight_stick_slot_x1,
            weight_stick_slot_y0, weight_stick_slot_y1,
            weight_overhang_roof_z0 - eps,
            weight_overhang_roof_z1 + eps
        );
    }
}
// =========================================================
// GEOMETRY
// =========================================================
rig_wall_extra_x = 3.0;
rig_wall_extra_z = 2.0;

// shifts only the wall profile upward so its ledge/bar Z can match wet rig
clock_wall_profile_dz = 5.0;
module wall_only() {
    if (show_wall)
        difference() {
            wall_x0 = hardware_x0 - wall_margin - rig_wall_extra_x;
            wall_x1 = hardware_x1 + wall_margin + rig_wall_extra_x;

            wall_z0 = hardware_z0 - wall_margin + 2 - rig_wall_extra_z
                      + clock_wall_profile_dz;

            base_wall_z1 = hardware_z1 + wall_margin + 7 + rig_wall_extra_z
                           + clock_wall_profile_dz;
            wall_z1 = max(
                base_wall_z1,
                weight_overhang_roof_z1
                    + weight_retainer_raise_z
                    + weight_retainer_wall_margin_z
            );

            rect_prism(
                wall_x0, wall_x1,
                0, wall_t,
                wall_z0, wall_z1
            );
        }
}

module latch_base_only() {
    union() {
        rect_prism(latch_pad_x0, latch_pad_x1, pad_y_wall, pad_y_out, -pad_h/2, pad_h/2);
        cyl_y_span(standoff_d, standoff_y0, standoff_y1);
        cyl_y_span(post_d,     post_y0,     post_y1);
        cyl_y_span(neck_d,     neck_y0,     neck_y1);
    }
}

module slotted_tunnel_only() {
    difference() {
        union() {
            rect_prism(tunnel_x0, tunnel_x1, tunnel_y_front, tunnel_y_back, tunnel_z0, tunnel_z1);
            rect_prism(slot_x0, slot_x1,
                slot_y0 - cubby_extra_y/2 - cubby_wall_y,
                slot_y1 + cubby_extra_y/2 + cubby_wall_y,
                tunnel_z0 - cubby_drop_z, tunnel_z0);
        }

        rect_prism(slot_x0, slot_x1, slot_y0, slot_y1, slot_z0, slot_z1);

        rect_prism(slot_x0, slot_x1,
            slot_y0 - cubby_extra_y/2,
            slot_y1 + cubby_extra_y/2,
            tunnel_z0 - cubby_drop_z + cubby_floor_z,
            tunnel_z0 - cubby_drop_z + cubby_floor_z + cubby_depth_z);
    }
}

module tunnel_visor() {
    rect_prism(visor_x0, visor_x1, visor_y0, visor_y1, visor_z0, visor_z1);
}
visor_drop_corner_chop_x = 6.0;
visor_drop_corner_chop_z = 6.0;
module tunnel_visor_drop() {
    difference() {
        rect_prism(visor_drop_x0, visor_drop_x1,
                   visor_drop_y0, visor_drop_y1,
                   visor_drop_z0, visor_drop_z1);

        // remove bottom-outboard corner of vertical drop to avoid support
        rect_prism(
            visor_drop_x1 - visor_drop_corner_chop_x,
            visor_drop_x1 + eps,
            visor_drop_y0 - eps,
            visor_drop_y1 + eps,
            visor_drop_z0 - eps,
            visor_drop_z0 + visor_drop_corner_chop_z
        );
    }
}
module tunnel_inner_stop() {
    rect_prism(inner_stop_x0, inner_stop_x1, inner_stop_y0, inner_stop_y1, inner_stop_z0, inner_stop_z1);
}

module tunnel_system_backing_wall() {
    union() {
        // Main tunnel body footprint.
        rect_prism(
            tunnel_x0, tunnel_x1,
            tunnel_backing_y0, tunnel_backing_y1,
            tunnel_z0, tunnel_z1
        );

        // Thin upper visor footprint.
        rect_prism(
            visor_x0, visor_x1,
            tunnel_backing_y0, tunnel_backing_y1,
            visor_z0, visor_z1
        );

        // Original inner-stop footprint.
        rect_prism(
            inner_stop_x0, inner_stop_x1,
            tunnel_backing_y0, tunnel_backing_y1,
            inner_stop_z0, inner_stop_z1
        );
    }
}

module relocated_tunnel_system() {
    translate([0, -tunnel_system_standoff_y, 0]) {
        slotted_tunnel_only();
        tunnel_visor();
        tunnel_visor_drop();
        tunnel_inner_stop();
        tunnel_crook();
    }
}

module assembly() {
    union() {
        wall_only();
        latch_base_only();
        tunnel_system_backing_wall();
        relocated_tunnel_system();
        carriage_blinders();
        translate([0, 0, weight_retainer_raise_z]) {
            stationary_weight_backer();
            weight_overhang_retainer();
        }
        lower_weight_stop_nubs();
    }
}

assembly();
